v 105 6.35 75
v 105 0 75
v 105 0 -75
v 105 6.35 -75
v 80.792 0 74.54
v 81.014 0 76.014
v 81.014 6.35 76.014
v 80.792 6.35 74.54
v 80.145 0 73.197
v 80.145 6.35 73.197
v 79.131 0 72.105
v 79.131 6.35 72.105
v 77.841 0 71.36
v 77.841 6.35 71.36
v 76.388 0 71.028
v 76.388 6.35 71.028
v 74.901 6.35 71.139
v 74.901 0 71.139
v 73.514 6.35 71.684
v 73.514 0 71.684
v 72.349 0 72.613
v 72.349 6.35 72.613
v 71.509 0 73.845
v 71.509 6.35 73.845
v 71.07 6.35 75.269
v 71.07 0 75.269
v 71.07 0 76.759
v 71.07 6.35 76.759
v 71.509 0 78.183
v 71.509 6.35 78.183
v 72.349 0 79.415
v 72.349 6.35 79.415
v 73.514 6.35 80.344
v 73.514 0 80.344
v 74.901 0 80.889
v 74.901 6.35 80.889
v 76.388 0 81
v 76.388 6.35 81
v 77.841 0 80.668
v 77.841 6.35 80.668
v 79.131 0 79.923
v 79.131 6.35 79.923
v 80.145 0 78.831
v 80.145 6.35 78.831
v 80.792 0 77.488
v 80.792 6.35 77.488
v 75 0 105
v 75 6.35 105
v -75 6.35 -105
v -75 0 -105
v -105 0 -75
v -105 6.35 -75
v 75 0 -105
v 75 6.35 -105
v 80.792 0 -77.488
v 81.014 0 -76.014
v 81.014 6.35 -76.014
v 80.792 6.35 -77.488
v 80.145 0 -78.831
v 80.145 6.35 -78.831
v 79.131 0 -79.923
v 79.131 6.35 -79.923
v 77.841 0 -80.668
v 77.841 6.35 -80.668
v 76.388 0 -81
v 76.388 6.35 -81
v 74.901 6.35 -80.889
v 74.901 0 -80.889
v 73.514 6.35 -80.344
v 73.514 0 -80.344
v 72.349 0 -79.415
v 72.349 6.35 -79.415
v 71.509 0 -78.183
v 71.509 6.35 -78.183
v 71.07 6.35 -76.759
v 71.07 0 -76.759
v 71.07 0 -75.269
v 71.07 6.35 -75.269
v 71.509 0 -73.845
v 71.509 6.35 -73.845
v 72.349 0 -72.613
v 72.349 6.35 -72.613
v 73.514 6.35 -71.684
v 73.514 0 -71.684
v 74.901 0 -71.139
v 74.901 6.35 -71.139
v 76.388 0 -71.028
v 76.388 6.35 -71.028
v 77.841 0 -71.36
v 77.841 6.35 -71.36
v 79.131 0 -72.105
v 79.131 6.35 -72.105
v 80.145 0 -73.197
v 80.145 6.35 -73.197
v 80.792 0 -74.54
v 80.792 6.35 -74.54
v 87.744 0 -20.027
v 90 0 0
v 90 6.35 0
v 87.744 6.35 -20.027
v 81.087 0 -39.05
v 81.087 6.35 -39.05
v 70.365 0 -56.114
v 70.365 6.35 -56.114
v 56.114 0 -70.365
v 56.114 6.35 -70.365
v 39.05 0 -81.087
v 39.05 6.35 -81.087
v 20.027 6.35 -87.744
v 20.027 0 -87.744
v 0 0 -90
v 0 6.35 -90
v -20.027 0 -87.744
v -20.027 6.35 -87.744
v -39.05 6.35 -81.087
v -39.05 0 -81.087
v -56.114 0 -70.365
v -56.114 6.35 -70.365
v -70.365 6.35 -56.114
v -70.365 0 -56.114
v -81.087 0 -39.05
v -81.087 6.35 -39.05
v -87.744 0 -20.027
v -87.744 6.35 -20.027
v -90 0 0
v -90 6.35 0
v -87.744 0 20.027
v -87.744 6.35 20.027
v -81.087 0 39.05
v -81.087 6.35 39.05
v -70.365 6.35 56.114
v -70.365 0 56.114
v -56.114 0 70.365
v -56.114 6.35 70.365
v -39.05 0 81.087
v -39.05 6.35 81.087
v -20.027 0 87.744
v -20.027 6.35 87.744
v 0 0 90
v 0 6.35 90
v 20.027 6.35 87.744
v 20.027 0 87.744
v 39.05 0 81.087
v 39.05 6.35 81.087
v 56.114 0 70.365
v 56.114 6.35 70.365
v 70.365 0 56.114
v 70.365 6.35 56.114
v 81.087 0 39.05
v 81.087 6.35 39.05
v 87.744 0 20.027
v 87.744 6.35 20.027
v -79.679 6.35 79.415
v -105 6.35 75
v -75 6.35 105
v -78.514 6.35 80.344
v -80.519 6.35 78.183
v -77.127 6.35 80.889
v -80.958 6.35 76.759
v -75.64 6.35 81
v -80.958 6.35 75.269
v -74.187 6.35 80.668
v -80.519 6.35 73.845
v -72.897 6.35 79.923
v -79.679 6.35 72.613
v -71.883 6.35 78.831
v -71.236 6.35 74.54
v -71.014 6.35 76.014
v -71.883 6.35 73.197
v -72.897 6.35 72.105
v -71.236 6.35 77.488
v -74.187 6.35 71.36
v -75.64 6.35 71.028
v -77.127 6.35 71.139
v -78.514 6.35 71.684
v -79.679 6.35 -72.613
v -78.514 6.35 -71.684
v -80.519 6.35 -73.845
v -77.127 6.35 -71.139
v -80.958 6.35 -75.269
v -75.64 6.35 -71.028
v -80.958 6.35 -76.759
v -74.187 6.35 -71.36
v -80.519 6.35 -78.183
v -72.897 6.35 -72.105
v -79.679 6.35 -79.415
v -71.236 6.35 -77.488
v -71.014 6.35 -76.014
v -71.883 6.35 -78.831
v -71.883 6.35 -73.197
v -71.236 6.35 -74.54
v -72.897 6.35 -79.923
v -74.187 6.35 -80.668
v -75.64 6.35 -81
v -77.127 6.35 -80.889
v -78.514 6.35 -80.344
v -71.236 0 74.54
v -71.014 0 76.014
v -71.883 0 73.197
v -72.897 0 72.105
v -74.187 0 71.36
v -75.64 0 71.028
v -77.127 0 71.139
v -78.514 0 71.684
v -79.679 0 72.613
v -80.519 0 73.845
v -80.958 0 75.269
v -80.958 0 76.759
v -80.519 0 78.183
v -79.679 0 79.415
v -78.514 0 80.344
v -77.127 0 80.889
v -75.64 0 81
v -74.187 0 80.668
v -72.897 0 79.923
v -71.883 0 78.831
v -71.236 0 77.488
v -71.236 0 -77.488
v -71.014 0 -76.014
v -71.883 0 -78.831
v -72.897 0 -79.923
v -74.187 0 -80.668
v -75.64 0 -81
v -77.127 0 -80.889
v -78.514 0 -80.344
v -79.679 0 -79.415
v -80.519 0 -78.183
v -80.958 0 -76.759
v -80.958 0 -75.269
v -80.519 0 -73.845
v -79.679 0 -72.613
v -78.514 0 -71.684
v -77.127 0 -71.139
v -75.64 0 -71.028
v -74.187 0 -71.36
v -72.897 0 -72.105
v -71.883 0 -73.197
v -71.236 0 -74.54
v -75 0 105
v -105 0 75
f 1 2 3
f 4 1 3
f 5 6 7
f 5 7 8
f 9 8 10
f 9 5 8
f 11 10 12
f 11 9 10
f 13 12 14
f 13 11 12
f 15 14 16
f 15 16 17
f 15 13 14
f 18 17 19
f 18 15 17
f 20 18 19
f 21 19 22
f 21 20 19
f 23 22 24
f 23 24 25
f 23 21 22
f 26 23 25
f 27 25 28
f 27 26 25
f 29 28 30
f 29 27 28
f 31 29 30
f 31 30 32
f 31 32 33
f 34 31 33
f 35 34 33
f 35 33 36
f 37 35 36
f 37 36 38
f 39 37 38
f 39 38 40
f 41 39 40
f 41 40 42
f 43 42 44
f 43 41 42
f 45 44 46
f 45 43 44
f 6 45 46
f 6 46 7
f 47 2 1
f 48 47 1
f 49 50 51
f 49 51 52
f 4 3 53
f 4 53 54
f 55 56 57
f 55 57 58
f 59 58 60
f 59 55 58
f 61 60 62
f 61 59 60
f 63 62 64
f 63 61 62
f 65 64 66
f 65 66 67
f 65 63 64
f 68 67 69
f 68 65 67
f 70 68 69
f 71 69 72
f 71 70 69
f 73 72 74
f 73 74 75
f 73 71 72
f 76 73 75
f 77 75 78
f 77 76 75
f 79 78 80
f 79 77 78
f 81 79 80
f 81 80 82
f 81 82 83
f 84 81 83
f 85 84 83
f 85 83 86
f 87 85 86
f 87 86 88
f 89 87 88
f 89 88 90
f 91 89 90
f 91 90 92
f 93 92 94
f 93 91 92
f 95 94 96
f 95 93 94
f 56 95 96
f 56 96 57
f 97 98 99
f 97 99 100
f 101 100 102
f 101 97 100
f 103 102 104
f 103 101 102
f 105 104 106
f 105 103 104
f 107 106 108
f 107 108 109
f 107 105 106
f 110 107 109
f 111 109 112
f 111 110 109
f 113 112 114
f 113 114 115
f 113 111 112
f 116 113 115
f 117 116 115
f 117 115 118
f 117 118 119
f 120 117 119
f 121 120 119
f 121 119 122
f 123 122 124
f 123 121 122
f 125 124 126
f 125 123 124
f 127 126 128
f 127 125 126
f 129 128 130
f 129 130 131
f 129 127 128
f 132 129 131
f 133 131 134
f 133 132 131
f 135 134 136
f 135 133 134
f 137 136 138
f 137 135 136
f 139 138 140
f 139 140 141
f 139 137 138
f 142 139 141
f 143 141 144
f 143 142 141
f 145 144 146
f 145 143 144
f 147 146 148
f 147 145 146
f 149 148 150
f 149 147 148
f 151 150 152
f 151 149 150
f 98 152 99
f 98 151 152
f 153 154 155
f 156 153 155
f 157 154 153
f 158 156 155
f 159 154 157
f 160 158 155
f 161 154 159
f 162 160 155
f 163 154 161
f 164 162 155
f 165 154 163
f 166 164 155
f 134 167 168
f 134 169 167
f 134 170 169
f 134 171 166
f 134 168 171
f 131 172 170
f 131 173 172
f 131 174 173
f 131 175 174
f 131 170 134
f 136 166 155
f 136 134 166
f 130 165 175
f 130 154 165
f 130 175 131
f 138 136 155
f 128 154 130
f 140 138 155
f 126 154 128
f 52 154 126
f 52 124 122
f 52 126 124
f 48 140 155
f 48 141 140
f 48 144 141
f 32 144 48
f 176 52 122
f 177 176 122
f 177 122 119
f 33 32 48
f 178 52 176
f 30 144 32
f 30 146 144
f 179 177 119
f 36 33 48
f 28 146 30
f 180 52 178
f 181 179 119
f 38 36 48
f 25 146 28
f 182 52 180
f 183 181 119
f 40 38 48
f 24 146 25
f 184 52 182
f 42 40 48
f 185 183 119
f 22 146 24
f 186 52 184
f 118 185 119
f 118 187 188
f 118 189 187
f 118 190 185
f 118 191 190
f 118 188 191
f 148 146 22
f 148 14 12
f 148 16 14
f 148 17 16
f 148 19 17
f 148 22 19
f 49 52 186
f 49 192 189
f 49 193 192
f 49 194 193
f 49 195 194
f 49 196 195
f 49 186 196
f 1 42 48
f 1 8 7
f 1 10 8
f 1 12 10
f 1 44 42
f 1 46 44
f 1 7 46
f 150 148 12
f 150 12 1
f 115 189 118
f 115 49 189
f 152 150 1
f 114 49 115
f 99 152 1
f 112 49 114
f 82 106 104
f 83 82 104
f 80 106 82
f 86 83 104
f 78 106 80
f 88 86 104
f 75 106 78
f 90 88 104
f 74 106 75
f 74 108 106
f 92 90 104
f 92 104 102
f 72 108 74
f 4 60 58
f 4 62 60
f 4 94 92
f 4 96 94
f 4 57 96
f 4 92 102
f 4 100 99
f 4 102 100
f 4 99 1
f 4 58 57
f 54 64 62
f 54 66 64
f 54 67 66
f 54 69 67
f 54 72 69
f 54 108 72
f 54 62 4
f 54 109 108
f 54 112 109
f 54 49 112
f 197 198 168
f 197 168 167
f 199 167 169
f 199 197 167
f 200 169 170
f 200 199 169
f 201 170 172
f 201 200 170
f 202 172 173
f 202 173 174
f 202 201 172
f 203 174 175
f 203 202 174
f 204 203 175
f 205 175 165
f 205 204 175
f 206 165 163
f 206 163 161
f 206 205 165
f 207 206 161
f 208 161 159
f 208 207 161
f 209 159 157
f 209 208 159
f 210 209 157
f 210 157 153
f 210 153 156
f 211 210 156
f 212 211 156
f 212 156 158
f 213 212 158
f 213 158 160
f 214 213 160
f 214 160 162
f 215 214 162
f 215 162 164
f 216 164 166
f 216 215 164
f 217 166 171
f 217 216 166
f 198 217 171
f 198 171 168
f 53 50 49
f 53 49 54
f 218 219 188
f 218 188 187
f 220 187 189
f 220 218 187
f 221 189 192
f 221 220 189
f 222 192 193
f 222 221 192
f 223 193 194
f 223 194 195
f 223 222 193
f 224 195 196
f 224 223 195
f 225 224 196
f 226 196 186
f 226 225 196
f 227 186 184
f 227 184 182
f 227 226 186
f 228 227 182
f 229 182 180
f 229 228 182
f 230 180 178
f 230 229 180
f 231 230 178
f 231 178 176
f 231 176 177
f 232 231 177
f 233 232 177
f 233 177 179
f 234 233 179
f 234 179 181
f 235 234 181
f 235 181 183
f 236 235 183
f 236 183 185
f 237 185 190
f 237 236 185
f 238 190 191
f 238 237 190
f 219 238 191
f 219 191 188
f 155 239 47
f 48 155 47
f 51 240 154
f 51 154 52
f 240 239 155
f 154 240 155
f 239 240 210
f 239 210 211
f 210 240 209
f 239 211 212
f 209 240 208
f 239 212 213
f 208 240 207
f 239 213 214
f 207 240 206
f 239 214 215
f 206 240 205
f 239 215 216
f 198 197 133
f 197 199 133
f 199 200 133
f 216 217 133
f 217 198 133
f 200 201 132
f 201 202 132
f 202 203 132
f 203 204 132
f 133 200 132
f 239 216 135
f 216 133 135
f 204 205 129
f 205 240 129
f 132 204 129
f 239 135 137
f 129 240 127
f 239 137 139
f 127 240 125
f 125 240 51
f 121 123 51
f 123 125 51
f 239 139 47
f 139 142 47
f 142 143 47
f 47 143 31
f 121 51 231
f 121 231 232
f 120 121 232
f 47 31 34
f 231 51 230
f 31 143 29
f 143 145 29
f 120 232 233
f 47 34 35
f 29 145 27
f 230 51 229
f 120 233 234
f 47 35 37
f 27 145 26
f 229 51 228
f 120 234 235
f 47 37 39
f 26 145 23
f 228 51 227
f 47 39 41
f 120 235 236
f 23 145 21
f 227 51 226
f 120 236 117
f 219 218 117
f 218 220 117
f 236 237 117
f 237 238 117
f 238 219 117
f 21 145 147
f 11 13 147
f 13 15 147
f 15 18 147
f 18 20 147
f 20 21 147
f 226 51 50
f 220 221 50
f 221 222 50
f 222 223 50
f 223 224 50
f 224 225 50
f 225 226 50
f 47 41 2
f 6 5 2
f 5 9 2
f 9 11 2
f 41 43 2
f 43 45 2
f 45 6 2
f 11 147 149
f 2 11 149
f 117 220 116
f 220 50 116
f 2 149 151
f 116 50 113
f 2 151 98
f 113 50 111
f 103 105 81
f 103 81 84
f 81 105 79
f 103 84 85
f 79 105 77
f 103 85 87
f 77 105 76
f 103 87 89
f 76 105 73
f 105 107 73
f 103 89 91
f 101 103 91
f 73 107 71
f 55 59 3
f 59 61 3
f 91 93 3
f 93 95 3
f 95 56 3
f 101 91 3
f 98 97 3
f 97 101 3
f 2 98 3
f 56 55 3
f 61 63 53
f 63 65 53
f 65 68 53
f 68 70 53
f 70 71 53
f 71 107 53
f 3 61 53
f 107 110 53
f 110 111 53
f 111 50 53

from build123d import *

# Parameters (mm, degrees)
SKETCH1_W           = 210
SKETCH1_H           = 210
SKETCH1_R           = 90
SKETCH1_R_2         = 5
BOSS_EXTRUDE1_DEPTH = 6.35
CHAMFER1_SIZE       = 30


with BuildPart() as part:
    # Sketch1 → Boss-Extrude1 (new body)
    with BuildSketch(Plane(origin=(0, 0, 0), x_dir=(1, 0, 0), z_dir=(0, 1, 0))):
        Rectangle(SKETCH1_W, SKETCH1_H)
        Circle(SKETCH1_R, mode=Mode.SUBTRACT)
        with Locations((-76.013978978, 76.013978978)):
            Circle(SKETCH1_R_2, mode=Mode.SUBTRACT)
        with Locations((76.013978978, 76.013978978)):
            Circle(SKETCH1_R_2, mode=Mode.SUBTRACT)
        with Locations((76.013978978, -76.013978978)):
            Circle(SKETCH1_R_2, mode=Mode.SUBTRACT)
        with Locations((-76.013978978, -76.013978978)):
            Circle(SKETCH1_R_2, mode=Mode.SUBTRACT)
    extrude(amount=BOSS_EXTRUDE1_DEPTH)

    # Chamfer1
    chamfer1_edges = [part.edges().sort_by_distance(p)[0] for p in [
        (105, 3.175, 105),
        (-105, 3.175, 105),
        (-105, 3.175, -105),
        (105, 3.175, -105),
    ]]
    chamfer(chamfer1_edges, length=CHAMFER1_SIZE)


solid = part.part
